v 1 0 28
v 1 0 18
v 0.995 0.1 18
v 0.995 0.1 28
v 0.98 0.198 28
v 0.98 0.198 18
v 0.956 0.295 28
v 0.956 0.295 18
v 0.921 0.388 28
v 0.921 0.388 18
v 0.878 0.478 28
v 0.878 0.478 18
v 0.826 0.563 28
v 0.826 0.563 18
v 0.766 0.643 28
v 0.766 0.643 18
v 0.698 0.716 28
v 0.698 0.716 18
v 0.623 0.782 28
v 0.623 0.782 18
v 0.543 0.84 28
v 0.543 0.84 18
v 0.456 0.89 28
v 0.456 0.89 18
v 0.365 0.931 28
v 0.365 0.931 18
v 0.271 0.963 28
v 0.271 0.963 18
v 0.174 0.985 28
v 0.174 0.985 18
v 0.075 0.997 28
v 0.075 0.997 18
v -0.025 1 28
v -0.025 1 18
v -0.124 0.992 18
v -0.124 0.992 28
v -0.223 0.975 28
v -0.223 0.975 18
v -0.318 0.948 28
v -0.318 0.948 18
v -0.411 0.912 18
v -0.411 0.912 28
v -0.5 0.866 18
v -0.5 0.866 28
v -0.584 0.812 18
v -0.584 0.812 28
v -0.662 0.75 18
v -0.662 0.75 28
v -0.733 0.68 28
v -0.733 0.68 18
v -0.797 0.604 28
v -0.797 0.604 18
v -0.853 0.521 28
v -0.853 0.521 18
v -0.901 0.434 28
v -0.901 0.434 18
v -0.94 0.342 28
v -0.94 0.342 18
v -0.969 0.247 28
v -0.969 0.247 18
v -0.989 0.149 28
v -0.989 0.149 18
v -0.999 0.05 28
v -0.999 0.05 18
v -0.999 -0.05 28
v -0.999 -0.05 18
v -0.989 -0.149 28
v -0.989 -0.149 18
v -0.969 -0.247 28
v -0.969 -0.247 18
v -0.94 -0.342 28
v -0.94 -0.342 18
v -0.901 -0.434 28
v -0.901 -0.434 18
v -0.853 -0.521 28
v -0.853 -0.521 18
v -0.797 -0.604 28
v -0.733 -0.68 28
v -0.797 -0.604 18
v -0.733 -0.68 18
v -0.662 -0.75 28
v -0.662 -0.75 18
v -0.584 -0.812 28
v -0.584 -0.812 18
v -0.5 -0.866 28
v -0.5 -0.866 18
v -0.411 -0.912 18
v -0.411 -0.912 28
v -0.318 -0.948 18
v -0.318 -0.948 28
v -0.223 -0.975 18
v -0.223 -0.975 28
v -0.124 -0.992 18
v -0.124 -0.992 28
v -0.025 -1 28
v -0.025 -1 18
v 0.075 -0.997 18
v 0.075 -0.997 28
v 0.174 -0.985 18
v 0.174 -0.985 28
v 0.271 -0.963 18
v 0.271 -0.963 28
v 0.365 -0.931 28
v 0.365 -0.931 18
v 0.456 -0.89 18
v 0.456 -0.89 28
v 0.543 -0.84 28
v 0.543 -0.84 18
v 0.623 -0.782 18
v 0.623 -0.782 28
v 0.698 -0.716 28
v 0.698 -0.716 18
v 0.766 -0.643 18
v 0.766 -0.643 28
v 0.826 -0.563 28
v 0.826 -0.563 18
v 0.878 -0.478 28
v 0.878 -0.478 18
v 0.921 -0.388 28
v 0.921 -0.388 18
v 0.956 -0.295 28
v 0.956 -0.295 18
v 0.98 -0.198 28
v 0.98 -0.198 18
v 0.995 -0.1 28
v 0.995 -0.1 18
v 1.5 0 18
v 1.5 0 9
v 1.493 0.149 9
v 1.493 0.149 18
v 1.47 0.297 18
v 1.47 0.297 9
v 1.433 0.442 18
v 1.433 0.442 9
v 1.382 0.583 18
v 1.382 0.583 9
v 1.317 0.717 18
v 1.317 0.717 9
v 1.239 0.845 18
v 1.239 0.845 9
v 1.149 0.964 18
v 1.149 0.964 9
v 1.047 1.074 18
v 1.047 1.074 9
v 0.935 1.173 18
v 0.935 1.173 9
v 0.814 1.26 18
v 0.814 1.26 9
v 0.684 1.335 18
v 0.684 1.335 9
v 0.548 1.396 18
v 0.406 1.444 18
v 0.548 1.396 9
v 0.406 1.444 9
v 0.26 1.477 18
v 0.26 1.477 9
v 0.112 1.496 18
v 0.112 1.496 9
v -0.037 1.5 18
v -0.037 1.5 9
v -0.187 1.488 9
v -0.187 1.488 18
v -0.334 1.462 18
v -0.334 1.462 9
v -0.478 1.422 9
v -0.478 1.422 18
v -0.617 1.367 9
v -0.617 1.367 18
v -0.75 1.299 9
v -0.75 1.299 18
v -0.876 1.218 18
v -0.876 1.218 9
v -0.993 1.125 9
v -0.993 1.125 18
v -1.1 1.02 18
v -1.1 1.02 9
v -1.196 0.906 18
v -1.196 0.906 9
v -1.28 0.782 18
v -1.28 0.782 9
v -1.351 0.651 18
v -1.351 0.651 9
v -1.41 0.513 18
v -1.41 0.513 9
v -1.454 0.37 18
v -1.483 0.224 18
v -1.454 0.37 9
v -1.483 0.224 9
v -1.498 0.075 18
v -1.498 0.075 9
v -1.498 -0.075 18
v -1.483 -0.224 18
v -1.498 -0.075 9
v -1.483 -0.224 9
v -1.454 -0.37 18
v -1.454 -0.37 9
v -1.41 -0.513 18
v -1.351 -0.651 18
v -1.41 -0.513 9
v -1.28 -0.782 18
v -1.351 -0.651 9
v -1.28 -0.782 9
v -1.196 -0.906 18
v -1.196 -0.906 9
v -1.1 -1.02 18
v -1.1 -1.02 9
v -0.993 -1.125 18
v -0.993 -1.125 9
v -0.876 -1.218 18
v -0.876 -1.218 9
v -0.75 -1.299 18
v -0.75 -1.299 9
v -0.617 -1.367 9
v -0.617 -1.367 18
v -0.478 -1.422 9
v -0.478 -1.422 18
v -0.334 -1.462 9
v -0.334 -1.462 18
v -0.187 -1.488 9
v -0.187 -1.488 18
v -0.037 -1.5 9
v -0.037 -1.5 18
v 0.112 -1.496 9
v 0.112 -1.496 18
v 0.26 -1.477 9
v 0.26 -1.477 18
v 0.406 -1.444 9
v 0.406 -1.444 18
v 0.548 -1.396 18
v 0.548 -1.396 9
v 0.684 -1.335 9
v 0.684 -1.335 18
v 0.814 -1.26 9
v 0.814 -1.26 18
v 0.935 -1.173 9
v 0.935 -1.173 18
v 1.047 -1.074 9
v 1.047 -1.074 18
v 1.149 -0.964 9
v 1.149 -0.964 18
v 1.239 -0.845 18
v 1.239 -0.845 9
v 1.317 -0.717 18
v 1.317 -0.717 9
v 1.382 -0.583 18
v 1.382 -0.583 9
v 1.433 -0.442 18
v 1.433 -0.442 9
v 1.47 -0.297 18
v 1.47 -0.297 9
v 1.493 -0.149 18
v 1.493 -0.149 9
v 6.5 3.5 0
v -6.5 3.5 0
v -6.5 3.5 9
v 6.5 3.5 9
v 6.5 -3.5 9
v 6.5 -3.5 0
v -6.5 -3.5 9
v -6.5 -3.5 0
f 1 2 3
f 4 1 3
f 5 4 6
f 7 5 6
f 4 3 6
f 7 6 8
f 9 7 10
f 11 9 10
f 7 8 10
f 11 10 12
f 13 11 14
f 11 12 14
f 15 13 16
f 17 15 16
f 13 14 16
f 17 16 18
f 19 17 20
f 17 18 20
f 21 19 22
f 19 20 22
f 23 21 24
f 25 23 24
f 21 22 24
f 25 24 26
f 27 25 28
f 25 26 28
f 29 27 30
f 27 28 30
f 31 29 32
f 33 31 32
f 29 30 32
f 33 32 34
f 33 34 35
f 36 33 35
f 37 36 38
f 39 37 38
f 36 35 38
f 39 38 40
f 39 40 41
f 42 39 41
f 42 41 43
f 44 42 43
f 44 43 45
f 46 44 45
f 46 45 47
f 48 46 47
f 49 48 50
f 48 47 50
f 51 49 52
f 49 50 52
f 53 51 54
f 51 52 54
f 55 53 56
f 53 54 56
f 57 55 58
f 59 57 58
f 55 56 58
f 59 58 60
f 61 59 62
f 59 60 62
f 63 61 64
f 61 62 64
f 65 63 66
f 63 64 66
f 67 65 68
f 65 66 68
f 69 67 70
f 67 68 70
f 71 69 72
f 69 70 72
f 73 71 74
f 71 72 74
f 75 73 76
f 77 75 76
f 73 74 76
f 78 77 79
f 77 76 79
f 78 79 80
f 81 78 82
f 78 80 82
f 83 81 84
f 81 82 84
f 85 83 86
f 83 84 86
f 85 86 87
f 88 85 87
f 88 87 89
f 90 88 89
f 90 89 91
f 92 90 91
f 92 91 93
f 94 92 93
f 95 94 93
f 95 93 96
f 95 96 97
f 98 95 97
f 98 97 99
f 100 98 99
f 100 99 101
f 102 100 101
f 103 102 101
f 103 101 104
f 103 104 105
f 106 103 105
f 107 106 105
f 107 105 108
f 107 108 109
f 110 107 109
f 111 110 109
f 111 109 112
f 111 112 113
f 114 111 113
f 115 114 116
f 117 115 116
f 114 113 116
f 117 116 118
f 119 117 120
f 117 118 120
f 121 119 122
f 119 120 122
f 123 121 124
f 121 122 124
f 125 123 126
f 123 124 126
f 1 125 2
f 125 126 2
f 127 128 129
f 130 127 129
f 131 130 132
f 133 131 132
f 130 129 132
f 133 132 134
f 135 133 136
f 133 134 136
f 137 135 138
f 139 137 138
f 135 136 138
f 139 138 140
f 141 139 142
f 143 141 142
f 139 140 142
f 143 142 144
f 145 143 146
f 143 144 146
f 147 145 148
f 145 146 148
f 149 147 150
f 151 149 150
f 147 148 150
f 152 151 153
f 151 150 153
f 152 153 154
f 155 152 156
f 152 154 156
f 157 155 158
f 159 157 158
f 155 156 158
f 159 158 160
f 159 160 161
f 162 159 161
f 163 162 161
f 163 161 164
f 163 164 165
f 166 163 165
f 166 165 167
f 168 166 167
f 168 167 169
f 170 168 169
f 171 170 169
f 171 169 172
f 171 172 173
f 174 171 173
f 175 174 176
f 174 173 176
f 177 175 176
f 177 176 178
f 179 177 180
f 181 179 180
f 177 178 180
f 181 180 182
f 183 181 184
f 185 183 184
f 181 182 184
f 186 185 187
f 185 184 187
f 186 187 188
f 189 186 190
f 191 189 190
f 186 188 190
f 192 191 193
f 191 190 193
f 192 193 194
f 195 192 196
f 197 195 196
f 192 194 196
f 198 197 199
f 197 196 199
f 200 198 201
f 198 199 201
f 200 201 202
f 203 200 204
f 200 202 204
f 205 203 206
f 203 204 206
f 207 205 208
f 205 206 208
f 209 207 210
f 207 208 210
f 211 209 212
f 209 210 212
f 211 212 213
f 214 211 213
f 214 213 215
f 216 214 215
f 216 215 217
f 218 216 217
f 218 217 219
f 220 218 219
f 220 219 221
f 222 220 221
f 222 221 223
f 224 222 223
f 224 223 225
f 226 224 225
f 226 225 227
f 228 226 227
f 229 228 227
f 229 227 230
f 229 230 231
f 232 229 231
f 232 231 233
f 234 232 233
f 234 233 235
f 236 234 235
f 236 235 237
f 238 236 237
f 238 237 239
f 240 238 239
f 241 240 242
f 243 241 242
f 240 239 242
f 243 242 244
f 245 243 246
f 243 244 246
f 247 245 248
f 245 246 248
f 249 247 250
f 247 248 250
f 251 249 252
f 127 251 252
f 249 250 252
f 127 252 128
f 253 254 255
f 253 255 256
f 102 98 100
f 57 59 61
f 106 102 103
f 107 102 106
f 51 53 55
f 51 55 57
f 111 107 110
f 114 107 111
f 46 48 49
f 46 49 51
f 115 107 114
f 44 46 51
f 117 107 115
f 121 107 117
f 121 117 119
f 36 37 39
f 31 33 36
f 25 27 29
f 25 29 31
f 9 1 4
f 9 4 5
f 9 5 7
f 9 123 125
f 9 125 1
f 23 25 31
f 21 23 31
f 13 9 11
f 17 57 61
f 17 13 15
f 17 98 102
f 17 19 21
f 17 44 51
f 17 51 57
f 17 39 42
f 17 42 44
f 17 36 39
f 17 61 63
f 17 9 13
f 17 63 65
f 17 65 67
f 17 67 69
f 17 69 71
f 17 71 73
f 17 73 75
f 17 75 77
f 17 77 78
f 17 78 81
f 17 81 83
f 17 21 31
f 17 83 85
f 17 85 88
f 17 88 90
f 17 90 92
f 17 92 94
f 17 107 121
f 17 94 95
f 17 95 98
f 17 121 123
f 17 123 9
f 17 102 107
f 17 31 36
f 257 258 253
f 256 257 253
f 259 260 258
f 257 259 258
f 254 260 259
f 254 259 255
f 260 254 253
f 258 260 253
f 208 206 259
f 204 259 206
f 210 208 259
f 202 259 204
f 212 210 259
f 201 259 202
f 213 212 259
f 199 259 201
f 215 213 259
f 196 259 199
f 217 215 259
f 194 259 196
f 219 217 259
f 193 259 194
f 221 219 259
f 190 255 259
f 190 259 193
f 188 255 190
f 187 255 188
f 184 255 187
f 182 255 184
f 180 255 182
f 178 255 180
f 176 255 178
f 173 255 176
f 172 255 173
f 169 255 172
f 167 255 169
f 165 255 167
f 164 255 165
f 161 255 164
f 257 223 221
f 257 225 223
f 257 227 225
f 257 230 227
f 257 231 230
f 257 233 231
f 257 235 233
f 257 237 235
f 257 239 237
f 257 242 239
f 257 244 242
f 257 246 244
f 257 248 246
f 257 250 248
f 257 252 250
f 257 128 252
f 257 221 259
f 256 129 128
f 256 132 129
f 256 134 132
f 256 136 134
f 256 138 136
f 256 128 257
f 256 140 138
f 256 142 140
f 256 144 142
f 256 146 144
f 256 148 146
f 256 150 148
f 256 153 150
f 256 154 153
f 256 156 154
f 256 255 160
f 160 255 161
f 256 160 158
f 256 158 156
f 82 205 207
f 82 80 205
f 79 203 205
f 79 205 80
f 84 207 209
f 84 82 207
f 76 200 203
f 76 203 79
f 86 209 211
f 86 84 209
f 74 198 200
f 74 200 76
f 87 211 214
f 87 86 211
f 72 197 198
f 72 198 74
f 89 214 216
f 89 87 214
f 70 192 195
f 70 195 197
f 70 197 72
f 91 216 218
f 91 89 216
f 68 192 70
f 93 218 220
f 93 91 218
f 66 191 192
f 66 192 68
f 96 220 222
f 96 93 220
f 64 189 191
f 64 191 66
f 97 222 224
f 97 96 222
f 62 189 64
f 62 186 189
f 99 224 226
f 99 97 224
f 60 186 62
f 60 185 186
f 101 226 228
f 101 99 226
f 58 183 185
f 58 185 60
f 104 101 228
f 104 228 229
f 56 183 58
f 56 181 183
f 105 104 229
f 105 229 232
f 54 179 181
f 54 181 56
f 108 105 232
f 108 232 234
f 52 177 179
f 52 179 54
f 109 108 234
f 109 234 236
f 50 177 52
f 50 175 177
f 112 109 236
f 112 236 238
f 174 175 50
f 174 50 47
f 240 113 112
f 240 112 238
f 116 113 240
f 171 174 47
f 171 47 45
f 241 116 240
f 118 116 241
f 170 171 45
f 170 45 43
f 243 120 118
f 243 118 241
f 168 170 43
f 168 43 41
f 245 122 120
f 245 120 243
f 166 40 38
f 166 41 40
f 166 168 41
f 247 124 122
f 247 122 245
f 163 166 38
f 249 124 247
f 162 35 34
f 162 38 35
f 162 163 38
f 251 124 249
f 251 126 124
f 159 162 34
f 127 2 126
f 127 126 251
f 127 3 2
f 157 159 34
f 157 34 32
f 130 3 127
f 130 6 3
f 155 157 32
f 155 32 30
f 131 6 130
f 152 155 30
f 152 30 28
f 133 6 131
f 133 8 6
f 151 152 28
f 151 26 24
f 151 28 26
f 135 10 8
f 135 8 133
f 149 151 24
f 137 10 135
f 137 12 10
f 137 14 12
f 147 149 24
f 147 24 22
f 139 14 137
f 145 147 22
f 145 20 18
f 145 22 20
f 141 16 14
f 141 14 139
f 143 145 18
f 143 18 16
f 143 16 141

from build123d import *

# Parameters (mm, degrees)
F0_W     = 13
F0_H     = 7
F1_DEPTH = 9
F2_R     = 1.5
F3_DEPTH = 9
F4_R     = 1
F5_DEPTH = 10


with BuildPart() as f1:
    # F0 (on Top) → F1 (new body)
    with BuildSketch(Plane.XY):
        Rectangle(F0_W, F0_H)
    extrude(amount=F1_DEPTH)

    # F2 (on face) → F3 (join)
    with BuildSketch(Plane.XY.offset(9)):
        Circle(F2_R)
    extrude(amount=F3_DEPTH)

    # F4 (on face) → F5 (join)
    with BuildSketch(Plane.XY.offset(18)):
        Circle(F4_R)
    extrude(amount=F5_DEPTH)


solid = f1.part
